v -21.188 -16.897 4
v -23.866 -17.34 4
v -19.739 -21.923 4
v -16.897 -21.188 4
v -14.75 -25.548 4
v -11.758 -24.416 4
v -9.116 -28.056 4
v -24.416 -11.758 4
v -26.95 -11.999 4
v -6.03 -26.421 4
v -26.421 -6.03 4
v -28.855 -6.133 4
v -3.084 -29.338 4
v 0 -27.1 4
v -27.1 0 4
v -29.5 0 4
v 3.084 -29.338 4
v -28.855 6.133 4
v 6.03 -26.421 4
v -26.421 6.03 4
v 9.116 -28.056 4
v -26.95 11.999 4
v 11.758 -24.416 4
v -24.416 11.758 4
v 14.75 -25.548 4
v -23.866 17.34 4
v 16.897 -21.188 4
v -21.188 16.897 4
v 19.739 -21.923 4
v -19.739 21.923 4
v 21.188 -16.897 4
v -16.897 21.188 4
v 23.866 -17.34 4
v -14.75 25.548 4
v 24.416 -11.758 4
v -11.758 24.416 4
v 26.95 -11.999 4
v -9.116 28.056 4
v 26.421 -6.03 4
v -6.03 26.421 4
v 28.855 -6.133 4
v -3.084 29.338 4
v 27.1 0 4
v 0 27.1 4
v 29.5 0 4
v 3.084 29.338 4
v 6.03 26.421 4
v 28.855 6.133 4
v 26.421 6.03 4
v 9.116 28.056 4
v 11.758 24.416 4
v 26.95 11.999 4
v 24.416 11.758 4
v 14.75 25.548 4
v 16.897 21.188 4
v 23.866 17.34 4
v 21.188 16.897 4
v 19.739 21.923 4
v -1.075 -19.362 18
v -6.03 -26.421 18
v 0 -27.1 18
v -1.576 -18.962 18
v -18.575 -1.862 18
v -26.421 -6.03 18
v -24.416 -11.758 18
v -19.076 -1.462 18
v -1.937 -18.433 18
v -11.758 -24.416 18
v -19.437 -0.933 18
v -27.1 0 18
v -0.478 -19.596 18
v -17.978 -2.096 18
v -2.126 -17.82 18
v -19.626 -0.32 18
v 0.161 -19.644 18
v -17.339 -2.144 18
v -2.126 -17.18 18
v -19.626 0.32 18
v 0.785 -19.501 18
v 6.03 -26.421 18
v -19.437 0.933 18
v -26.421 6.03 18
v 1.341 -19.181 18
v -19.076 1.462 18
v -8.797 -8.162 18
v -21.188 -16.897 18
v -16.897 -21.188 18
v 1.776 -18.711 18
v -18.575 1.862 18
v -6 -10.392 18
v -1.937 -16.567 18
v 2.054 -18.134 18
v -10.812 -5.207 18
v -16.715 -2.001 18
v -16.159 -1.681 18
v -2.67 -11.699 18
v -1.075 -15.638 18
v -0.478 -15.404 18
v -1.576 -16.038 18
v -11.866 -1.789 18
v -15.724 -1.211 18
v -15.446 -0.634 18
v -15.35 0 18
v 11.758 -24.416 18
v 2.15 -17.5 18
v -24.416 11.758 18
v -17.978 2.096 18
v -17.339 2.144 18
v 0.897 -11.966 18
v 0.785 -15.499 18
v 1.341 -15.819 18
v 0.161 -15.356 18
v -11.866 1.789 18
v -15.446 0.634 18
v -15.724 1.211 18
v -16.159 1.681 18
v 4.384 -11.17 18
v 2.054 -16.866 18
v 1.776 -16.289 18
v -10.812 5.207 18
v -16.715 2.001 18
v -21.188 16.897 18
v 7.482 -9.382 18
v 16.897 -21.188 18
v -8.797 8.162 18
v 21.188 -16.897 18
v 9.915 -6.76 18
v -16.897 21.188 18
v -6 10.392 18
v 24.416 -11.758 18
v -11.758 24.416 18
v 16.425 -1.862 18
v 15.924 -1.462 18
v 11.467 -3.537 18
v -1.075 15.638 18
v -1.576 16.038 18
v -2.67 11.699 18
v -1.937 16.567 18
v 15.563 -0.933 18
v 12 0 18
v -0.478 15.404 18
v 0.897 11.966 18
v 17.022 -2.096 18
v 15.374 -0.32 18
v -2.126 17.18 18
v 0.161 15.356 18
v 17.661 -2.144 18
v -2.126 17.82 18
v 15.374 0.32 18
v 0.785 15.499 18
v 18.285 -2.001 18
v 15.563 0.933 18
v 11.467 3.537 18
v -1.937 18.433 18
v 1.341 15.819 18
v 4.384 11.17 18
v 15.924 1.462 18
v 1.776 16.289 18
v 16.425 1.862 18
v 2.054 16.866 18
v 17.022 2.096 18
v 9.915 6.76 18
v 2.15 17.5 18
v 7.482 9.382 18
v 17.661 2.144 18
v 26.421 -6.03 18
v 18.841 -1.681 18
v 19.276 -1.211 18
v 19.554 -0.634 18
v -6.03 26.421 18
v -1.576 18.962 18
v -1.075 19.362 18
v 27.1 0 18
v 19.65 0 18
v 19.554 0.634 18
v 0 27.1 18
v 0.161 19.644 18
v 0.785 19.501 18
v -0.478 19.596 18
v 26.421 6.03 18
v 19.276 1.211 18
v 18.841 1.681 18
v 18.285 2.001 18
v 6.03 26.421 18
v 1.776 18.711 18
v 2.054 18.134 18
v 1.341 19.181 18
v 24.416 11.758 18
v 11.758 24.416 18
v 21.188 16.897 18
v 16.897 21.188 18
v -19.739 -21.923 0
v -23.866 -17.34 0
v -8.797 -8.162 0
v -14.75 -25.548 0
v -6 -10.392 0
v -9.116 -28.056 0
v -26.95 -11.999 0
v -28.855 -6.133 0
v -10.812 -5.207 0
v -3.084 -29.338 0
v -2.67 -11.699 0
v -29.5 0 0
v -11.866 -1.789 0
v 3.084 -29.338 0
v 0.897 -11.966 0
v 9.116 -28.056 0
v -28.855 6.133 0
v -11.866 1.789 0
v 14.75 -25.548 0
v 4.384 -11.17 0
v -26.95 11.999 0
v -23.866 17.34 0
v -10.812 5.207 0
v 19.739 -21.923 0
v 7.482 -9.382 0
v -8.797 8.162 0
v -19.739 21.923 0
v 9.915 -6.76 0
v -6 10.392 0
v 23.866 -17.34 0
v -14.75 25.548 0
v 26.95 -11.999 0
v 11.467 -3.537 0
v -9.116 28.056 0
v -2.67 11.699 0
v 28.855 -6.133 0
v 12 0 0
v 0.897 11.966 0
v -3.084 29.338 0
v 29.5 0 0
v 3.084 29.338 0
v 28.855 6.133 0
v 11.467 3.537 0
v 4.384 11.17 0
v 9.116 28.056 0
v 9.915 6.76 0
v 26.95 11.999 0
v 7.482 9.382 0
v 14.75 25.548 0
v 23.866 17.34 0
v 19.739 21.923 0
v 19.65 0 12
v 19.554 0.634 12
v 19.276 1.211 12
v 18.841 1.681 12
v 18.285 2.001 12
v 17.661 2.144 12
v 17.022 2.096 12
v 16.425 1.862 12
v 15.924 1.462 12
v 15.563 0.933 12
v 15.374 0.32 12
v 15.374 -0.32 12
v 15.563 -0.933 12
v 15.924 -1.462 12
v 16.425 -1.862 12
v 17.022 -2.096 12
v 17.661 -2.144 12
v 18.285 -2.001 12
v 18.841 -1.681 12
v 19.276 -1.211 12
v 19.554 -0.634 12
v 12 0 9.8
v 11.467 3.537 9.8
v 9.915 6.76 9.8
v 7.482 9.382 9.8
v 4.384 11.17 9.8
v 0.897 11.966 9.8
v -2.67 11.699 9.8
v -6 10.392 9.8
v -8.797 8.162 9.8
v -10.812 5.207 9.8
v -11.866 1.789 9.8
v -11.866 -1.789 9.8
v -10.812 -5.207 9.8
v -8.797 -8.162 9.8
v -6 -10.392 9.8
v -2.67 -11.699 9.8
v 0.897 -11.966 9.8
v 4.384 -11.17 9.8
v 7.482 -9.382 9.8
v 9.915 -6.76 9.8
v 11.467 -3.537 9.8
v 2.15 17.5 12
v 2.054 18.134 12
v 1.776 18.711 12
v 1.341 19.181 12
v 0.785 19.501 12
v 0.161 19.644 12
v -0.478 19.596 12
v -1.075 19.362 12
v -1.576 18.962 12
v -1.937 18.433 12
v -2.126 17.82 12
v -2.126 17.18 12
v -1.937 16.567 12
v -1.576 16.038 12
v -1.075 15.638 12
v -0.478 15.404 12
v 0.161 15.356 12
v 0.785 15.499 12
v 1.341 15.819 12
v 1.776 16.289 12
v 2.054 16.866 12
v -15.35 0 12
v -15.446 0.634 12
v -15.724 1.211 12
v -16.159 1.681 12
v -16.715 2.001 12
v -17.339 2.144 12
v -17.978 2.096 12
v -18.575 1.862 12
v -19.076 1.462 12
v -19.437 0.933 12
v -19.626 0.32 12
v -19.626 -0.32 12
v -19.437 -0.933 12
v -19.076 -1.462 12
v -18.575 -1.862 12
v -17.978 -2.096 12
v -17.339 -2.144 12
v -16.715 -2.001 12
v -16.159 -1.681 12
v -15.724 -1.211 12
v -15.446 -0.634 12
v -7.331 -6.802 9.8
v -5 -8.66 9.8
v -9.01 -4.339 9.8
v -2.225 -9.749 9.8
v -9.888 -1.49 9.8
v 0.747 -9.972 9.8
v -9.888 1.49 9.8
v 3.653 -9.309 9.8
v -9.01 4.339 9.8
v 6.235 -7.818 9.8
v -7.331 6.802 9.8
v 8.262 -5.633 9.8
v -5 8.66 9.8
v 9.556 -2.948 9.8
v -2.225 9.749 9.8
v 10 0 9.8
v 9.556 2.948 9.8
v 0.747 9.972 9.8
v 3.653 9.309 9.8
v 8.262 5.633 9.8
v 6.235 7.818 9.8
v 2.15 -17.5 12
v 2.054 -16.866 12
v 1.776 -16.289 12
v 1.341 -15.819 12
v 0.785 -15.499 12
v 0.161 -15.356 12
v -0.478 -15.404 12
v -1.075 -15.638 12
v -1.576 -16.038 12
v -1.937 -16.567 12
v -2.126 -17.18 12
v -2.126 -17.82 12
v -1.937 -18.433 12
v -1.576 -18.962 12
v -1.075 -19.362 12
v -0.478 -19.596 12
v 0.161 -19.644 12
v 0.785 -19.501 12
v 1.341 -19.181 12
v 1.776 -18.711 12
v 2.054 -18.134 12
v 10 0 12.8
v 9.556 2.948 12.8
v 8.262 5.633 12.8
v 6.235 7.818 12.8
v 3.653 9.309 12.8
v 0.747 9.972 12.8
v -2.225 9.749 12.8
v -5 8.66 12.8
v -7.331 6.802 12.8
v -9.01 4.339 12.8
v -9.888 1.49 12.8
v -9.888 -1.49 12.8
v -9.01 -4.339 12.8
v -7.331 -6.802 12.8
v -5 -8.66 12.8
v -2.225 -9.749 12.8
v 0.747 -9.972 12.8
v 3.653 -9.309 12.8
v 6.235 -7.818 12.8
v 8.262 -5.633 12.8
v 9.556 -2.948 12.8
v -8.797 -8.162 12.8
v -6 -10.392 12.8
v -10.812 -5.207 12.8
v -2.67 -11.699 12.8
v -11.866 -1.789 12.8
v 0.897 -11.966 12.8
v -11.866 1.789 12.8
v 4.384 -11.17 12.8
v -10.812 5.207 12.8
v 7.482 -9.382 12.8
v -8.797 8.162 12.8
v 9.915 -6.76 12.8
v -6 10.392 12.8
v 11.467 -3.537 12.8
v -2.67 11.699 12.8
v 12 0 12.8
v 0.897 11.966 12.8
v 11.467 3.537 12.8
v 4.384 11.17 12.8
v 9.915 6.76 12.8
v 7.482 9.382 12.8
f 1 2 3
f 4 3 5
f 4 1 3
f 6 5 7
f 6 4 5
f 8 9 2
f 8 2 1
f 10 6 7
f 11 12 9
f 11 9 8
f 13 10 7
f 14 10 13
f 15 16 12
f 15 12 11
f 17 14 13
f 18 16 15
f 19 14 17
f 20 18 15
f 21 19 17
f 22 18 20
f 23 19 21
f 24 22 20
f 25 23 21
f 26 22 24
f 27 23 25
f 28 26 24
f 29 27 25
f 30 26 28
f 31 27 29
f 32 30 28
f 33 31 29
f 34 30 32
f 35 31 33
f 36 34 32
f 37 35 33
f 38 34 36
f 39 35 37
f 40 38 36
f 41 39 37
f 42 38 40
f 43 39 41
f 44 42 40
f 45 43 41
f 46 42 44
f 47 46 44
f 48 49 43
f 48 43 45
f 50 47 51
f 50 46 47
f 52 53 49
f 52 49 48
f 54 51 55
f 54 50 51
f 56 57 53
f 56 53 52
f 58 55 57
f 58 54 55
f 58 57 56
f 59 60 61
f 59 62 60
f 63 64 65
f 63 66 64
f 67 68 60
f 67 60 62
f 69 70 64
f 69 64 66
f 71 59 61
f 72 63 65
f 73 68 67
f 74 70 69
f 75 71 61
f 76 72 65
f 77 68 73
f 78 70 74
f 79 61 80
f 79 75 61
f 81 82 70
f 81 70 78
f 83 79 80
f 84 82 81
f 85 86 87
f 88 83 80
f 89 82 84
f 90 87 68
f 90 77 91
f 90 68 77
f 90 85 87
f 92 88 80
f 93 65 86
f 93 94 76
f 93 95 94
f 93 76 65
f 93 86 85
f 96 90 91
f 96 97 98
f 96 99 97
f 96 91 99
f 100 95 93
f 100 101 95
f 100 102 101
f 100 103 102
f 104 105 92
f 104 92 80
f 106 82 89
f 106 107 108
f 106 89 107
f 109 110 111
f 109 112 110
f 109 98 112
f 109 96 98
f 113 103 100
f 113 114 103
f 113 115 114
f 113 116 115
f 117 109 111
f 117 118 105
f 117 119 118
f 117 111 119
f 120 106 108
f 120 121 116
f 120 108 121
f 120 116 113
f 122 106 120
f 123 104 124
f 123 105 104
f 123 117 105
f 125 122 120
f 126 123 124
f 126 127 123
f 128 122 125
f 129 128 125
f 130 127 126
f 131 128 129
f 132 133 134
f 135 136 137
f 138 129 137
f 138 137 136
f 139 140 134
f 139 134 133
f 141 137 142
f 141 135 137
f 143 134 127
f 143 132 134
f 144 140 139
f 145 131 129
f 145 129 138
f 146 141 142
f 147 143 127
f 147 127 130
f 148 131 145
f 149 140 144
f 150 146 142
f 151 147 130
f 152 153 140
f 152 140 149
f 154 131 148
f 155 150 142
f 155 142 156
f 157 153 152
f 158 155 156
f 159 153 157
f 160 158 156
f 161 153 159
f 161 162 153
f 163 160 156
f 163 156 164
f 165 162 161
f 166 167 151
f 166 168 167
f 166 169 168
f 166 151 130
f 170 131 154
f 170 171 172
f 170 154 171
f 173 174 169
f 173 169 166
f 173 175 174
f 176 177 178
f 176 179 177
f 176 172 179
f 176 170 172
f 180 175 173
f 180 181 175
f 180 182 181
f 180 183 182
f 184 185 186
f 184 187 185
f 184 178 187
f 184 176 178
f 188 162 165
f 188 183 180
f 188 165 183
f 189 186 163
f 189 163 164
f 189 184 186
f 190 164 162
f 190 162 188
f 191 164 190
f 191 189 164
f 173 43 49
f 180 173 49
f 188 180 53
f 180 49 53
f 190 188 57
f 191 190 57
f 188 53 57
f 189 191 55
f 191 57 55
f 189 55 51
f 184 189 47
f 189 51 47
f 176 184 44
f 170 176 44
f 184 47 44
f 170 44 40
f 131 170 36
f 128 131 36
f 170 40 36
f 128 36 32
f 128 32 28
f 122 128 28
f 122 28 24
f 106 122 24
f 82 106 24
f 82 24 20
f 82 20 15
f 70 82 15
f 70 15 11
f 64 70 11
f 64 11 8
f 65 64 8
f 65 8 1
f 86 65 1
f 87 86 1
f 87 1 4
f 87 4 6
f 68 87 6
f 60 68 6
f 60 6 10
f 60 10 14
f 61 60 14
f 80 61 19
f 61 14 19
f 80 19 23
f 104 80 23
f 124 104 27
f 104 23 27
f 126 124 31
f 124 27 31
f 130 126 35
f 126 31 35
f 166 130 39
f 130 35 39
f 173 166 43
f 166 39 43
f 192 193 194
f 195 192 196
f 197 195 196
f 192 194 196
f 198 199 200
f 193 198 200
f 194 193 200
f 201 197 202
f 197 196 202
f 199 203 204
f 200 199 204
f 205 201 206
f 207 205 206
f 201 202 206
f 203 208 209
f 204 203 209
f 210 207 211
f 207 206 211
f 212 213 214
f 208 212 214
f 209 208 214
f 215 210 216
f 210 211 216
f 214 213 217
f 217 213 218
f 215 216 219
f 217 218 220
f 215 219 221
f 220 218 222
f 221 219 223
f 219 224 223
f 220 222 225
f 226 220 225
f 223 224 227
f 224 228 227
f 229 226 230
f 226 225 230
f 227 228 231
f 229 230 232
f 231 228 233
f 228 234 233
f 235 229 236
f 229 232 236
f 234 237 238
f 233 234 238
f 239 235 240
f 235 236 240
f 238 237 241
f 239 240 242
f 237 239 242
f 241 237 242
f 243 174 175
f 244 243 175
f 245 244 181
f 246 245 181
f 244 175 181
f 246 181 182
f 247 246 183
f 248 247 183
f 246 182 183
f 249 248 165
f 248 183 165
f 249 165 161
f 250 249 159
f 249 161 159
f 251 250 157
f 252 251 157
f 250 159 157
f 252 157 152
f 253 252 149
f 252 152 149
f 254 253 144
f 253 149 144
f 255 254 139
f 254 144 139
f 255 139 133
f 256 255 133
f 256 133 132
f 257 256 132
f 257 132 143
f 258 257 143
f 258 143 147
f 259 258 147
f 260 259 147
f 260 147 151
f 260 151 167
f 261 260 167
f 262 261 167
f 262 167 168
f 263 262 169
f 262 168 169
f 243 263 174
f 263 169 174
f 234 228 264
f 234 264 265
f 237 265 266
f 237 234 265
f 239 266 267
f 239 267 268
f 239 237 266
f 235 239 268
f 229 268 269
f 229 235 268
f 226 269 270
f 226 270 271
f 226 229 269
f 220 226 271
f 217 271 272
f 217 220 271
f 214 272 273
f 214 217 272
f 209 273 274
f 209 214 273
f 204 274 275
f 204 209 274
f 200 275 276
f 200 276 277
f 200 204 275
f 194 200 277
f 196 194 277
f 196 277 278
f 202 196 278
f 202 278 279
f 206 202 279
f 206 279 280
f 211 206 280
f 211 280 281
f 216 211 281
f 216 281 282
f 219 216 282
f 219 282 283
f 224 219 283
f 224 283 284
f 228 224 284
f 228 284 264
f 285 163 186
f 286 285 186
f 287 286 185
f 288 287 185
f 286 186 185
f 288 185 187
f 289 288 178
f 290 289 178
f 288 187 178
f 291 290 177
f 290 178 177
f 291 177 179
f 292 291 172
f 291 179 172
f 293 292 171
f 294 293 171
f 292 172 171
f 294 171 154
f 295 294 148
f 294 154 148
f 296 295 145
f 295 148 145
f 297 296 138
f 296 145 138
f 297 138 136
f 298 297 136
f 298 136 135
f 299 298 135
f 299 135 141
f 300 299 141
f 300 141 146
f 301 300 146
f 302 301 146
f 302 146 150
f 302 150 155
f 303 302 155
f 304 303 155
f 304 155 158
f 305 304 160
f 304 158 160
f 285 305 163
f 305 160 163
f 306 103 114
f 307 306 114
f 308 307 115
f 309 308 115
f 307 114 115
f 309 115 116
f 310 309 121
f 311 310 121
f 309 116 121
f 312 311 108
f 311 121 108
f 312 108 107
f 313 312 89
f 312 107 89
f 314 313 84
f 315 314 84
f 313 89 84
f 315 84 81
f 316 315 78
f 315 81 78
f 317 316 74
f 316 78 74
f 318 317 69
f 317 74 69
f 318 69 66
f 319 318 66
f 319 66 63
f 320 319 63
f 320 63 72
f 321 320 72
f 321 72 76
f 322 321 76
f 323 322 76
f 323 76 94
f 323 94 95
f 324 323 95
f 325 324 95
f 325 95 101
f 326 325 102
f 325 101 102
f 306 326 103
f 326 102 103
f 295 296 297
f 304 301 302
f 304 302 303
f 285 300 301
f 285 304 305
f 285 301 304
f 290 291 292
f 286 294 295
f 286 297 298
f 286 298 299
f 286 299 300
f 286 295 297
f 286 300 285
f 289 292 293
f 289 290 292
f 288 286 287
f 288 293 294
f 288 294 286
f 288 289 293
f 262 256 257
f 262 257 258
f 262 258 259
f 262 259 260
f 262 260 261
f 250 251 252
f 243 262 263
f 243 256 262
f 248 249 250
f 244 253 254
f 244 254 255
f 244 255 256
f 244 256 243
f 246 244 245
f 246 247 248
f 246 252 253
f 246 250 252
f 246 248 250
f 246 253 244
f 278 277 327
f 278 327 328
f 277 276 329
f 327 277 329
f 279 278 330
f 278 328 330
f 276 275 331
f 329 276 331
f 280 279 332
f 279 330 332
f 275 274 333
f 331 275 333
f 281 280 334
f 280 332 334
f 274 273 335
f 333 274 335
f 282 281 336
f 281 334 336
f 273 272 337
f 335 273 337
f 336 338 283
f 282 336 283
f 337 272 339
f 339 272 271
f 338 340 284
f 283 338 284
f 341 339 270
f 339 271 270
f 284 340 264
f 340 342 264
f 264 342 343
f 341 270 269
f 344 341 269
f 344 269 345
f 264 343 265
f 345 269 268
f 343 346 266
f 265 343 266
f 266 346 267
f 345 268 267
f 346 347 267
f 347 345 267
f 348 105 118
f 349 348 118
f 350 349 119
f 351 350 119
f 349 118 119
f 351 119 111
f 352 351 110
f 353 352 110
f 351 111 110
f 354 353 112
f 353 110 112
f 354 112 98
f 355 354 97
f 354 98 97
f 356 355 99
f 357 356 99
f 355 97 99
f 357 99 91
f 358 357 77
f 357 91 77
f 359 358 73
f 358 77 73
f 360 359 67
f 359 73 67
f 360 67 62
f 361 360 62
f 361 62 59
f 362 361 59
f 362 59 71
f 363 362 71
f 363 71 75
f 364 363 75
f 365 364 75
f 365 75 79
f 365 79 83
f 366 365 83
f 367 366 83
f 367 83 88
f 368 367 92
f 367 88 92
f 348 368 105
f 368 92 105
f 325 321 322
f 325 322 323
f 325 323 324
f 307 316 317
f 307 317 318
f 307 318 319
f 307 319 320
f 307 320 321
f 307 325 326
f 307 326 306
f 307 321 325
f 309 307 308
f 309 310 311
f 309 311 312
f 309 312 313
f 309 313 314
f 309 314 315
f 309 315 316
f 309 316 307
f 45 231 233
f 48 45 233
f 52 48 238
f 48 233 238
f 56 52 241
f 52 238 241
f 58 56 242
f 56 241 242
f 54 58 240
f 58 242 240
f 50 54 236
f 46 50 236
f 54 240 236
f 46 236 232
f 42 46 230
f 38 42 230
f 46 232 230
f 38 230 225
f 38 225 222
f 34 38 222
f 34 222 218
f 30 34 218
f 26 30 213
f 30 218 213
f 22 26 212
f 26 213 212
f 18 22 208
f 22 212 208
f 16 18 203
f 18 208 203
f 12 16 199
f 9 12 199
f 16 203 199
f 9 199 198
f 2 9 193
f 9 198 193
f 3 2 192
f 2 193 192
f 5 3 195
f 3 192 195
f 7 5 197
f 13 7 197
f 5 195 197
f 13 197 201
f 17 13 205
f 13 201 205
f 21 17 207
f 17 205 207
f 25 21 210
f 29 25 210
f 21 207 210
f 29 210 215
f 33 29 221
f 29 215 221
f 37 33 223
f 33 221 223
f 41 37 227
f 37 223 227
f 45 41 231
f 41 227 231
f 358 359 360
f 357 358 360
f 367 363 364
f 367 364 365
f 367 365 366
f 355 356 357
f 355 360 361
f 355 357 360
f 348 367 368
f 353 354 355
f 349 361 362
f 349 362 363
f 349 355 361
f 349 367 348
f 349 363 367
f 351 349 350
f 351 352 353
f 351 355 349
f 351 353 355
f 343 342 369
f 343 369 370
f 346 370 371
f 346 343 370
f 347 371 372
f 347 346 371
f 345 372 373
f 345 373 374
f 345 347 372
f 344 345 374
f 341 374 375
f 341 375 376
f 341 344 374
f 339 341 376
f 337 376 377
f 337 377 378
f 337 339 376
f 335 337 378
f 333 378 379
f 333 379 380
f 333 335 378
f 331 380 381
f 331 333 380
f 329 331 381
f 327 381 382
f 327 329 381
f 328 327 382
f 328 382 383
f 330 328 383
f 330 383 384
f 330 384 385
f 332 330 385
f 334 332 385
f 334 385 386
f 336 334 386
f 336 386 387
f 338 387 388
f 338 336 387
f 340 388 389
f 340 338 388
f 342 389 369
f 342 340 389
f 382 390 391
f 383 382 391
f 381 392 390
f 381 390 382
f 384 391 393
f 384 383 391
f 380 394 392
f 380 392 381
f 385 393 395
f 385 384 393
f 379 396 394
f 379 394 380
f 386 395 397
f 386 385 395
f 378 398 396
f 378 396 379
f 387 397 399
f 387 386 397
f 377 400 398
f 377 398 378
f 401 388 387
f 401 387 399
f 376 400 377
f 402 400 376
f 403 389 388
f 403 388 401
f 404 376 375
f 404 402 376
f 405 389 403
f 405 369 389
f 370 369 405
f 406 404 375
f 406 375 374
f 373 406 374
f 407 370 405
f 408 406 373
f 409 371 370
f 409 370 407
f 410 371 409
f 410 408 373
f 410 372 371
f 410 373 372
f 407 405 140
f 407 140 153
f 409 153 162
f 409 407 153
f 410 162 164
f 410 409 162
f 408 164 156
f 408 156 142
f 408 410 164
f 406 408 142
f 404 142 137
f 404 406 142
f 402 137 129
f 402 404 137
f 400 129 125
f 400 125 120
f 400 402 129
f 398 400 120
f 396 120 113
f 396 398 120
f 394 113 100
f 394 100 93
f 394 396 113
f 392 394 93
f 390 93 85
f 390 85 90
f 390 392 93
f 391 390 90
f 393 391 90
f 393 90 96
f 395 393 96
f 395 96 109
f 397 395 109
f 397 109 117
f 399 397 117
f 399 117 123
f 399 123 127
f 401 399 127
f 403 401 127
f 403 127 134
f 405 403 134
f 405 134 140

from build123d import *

# Parameters (mm, degrees)
SKETCH1_R           = 29.5
SKETCH1_R_2         = 27.1
BOSS_EXTRUDE1_DEPTH = 4
SKETCH1_3_R         = 27.1
SKETCH1_3_R_2       = 12
BOSS_EXTRUDE2_DEPTH = 18
BOSS_EXTRUDE3_START = 9.8
SKETCH1_4_R         = 12
SKETCH1_4_R_2       = 10
BOSS_EXTRUDE3_DEPTH = 3
SKETCH4_R           = 2.15
CUT_EXTRUDE1_DEPTH  = 6


with BuildPart() as part:
    # Sketch1 → Boss-Extrude1 (new body)
    with BuildSketch(Plane.XY):
        Circle(SKETCH1_R)
        Circle(SKETCH1_R_2, mode=Mode.SUBTRACT)
    extrude(amount=BOSS_EXTRUDE1_DEPTH)

    # Sketch1<3> → Boss-Extrude2 (add)
    with BuildSketch(Plane.XY):
        Circle(SKETCH1_3_R)
        Circle(SKETCH1_3_R_2, mode=Mode.SUBTRACT)
    extrude(amount=BOSS_EXTRUDE2_DEPTH)

    # Sketch1<4> → Boss-Extrude3 (add)
    with BuildSketch(Plane.XY.offset(BOSS_EXTRUDE3_START)):
        Circle(SKETCH1_4_R)
        Circle(SKETCH1_4_R_2, mode=Mode.SUBTRACT)
    extrude(amount=BOSS_EXTRUDE3_DEPTH)

    # Sketch4 → Cut-Extrude1 (cut)
    with BuildSketch(Plane.XY.offset(18)):
        with Locations((0, 17.5)):
            Circle(SKETCH4_R)
        with Locations((17.5, 0)):
            Circle(SKETCH4_R)
        with Locations((0, -17.5)):
            Circle(SKETCH4_R)
        with Locations((-17.5, 0)):
            Circle(SKETCH4_R)
    extrude(amount=-CUT_EXTRUDE1_DEPTH, mode=Mode.SUBTRACT)


solid = part.part
